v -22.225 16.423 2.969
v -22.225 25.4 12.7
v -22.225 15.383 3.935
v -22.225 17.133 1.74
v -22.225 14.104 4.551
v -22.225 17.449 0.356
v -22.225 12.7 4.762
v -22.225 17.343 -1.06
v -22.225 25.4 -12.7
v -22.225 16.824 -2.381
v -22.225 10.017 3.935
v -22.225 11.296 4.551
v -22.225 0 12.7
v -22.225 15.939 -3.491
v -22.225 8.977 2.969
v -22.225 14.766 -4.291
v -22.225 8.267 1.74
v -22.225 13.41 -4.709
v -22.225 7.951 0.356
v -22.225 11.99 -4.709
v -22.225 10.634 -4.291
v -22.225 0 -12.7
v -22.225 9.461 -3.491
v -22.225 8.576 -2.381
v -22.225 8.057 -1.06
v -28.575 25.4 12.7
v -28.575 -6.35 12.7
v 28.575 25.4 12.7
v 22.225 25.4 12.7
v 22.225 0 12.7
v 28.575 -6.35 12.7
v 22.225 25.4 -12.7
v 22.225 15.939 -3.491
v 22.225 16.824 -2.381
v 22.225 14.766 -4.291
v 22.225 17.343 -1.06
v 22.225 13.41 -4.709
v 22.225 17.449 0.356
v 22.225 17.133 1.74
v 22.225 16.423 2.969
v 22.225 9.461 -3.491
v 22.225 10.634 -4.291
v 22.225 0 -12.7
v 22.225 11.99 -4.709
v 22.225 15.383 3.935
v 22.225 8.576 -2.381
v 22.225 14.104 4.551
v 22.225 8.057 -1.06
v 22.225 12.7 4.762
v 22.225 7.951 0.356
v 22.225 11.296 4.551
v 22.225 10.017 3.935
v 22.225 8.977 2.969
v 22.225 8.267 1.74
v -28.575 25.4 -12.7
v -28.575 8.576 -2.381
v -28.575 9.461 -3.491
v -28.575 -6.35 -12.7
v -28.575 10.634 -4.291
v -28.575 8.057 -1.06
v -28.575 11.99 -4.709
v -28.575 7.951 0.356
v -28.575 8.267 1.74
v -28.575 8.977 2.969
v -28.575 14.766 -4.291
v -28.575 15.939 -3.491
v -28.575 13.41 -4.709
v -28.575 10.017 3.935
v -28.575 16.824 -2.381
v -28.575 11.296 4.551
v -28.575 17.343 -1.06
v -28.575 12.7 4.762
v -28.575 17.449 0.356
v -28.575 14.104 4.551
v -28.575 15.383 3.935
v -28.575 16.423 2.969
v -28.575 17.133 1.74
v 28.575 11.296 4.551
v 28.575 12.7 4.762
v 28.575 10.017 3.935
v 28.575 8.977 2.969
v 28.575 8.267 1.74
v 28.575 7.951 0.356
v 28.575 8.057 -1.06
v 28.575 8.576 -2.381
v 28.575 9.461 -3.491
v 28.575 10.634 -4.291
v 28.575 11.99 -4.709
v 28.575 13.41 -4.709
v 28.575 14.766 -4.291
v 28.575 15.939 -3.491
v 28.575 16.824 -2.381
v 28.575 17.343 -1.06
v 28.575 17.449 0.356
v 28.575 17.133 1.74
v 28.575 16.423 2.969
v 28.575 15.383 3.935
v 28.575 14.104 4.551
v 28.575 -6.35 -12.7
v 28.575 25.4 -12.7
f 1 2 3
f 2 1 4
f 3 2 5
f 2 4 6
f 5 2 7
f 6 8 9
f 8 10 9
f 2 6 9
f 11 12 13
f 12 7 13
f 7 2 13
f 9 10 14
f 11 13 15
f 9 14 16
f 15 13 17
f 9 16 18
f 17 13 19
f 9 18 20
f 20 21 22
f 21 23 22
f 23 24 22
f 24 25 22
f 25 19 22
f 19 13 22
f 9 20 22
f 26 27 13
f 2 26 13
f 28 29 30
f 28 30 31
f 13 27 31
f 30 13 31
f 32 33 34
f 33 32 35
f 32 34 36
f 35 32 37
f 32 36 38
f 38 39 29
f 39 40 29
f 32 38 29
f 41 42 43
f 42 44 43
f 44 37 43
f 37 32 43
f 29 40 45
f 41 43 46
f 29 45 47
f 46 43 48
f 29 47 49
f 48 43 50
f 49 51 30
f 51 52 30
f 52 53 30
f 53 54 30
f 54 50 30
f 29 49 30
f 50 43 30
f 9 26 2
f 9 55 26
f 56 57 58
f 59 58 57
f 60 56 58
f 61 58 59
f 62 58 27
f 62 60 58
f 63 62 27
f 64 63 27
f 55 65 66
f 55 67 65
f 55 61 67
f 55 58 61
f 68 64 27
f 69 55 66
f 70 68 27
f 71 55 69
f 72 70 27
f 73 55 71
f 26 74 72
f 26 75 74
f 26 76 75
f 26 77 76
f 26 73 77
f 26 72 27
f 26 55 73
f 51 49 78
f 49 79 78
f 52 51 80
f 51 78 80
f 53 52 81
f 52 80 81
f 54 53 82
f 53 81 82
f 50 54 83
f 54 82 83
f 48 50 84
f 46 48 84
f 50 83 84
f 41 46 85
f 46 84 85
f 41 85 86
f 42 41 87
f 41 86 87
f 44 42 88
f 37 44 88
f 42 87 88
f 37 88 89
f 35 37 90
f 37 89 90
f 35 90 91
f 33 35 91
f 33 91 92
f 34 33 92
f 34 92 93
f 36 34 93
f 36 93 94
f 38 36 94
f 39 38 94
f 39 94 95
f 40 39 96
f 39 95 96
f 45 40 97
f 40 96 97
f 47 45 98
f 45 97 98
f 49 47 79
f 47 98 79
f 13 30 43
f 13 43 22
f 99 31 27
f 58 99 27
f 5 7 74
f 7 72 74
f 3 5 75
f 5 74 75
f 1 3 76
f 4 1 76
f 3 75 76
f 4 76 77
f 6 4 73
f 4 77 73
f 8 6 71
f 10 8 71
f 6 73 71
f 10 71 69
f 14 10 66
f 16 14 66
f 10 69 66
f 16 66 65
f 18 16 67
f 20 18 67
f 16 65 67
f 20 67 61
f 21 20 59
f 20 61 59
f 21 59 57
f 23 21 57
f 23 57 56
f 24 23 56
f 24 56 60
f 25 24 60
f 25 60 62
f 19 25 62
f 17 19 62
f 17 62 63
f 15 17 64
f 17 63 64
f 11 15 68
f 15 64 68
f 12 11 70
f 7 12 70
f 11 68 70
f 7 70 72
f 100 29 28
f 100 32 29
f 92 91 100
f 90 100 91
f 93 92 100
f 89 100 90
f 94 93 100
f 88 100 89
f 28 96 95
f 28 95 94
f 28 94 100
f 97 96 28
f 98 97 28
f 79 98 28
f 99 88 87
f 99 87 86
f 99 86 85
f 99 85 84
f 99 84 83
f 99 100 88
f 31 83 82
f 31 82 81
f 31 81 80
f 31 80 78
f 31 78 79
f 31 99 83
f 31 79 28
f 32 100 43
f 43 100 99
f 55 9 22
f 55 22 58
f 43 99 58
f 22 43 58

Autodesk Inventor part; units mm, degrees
ref_plane "XZ Plane" through (0, 0, 0) normal (0, 1, 0) x (-1, 0, 0)
sketch "Sketch1" plane through (0, 0, 0) normal (0, 1, 0) x (-1, 0, 0)
  line L0 (28.575, 12.7) -> (-28.575, 12.7)
  line L1 (-28.575, 12.7) -> (-28.575, -12.7)
  line L2 (-28.575, -12.7) -> (28.575, -12.7)
  line L3 (28.575, -12.7) -> (28.575, 12.7)
  line L4 (28.575, 12.7) -> (-28.575, -12.7) construction
  line L5 (-28.575, 12.7) -> (28.575, -12.7) construction
  point P0 (0, 0)
  dimension "d0" = 57.15
  dimension "d1" = 25.4
extrude "Extrusion1" add sketch "Sketch1" against normal blind 6.35
sketch "Sketch2" plane through (0, 0, 0) normal (0, 1, 0) x (1, 0, 0)
  line L0 (-28.575, -12.7) -> (-28.575, 12.7) projected
  line L1 (-28.575, -12.7) -> (-22.225, -12.7)
  line L2 (-22.225, -12.7) -> (-22.225, 12.7)
  line L3 (-22.225, 12.7) -> (-28.575, 12.7)
  line L4 (-28.575, 12.7) -> (-28.575, -12.7)
  point P0 (0, 0)
  dimension "d4" = 6.35
extrude "Extrusion2" add sketch "Sketch2" along normal blind 25.4
sketch "Sketch3" plane through (-28.575, -6.35, -12.7) normal (-1, 0, 0) x (0, 0, 1)
  circle A0 centre (12.7, 19.05) radius 4.7625
  line L0 (0, 31.75) -> (25.4, 31.75) projected
  circle A1 centre (12.7, -19.05) radius 4.0284
  point P0 (12.7, 6.35)
  dimension "d7" = 9.525
  dimension "d8" = 12.7
  dimension "d11" = 50.8
extrude "Extrusion3" cut sketch "Sketch3" against normal through all contours A0
mirror "Mirror1" about plane through (0, 0, 0) normal (1, 0, 0) of "Extrusion2", "Extrusion3"
properties part number "camPostHolderV02"
